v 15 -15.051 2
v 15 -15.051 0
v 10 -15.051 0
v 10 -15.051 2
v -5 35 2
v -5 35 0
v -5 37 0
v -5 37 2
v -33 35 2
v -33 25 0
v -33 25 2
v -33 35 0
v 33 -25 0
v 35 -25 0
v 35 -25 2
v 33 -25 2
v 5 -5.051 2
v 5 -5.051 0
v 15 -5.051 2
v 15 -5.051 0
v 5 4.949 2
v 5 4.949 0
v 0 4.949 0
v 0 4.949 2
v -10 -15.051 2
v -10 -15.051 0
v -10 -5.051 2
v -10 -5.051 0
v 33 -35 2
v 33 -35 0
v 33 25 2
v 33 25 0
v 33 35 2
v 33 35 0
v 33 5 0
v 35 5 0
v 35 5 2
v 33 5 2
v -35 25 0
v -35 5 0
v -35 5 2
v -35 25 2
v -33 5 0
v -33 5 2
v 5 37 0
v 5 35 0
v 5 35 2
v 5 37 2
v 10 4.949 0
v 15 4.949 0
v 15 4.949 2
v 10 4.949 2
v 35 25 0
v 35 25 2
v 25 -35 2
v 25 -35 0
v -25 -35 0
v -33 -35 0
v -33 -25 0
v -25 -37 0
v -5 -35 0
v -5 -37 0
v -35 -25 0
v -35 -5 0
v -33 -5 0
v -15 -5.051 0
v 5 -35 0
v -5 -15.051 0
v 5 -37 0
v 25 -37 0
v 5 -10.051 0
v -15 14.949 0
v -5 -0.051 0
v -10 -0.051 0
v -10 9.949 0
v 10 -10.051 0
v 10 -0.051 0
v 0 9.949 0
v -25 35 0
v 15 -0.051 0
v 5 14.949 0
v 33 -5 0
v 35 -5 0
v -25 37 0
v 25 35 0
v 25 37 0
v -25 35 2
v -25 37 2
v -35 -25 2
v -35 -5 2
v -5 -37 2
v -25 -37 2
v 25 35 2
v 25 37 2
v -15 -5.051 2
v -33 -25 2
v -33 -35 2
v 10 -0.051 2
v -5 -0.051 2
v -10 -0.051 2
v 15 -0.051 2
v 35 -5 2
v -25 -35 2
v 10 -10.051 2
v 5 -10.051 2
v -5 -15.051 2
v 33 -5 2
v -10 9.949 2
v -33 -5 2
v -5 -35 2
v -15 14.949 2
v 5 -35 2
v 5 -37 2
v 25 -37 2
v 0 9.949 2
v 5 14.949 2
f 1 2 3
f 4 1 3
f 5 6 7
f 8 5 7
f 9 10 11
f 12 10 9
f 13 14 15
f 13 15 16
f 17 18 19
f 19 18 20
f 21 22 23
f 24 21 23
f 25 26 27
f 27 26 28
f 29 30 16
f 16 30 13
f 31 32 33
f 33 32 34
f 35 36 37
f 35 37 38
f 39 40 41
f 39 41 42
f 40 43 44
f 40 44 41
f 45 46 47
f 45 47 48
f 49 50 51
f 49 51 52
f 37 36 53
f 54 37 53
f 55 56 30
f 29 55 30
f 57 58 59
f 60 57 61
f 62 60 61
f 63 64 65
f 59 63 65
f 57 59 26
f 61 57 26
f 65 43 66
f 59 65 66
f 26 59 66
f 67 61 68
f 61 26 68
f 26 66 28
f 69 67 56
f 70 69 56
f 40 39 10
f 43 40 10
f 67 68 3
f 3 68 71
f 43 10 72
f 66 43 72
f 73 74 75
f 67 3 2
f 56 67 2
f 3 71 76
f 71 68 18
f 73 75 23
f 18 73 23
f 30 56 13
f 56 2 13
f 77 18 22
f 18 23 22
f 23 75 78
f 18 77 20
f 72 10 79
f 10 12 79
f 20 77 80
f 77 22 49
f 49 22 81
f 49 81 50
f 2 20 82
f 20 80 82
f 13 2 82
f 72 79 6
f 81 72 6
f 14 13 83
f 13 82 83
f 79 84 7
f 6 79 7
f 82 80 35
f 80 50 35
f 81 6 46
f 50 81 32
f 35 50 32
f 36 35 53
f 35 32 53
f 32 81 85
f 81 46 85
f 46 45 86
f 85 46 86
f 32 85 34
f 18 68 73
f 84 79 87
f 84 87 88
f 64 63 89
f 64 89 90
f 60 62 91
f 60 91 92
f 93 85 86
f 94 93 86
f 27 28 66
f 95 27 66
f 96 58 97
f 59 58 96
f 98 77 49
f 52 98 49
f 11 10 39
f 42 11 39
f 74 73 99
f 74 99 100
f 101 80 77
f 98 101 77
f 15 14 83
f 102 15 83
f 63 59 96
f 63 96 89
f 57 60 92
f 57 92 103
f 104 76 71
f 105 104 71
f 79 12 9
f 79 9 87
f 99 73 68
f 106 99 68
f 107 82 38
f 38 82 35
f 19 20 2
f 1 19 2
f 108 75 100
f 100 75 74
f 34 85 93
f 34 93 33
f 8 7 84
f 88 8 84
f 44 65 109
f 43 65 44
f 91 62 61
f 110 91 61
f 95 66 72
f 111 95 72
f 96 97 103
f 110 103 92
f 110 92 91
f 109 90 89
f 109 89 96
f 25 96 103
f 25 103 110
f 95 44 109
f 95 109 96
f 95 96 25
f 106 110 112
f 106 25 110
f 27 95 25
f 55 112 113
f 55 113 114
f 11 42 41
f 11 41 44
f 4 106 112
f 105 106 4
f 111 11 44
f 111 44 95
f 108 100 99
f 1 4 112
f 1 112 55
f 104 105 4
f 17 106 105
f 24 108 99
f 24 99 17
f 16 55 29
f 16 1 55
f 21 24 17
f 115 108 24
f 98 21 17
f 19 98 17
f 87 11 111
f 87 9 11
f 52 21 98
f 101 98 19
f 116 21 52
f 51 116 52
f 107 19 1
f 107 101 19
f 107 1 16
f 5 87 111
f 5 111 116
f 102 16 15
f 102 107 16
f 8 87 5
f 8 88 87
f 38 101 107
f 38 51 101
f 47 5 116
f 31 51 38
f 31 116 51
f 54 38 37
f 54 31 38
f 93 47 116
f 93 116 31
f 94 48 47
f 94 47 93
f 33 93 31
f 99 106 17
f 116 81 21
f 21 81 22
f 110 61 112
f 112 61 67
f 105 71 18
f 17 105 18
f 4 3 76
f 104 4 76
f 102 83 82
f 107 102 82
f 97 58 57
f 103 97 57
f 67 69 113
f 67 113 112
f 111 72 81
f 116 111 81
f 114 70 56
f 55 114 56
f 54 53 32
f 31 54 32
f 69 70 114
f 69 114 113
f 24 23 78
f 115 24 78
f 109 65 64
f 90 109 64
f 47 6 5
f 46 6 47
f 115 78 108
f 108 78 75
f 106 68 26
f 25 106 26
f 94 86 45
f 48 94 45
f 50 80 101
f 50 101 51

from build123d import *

# Parameters (mm, degrees)
SKETCH1_W           = 66
SKETCH1_H           = 70
BOSS_EXTRUDE1_DEPTH = 2
SKETCH2_W           = 2
SKETCH2_H           = 20
BOSS_EXTRUDE2_DEPTH = 2
SKETCH3_W           = 20
SKETCH3_H           = 2
BOSS_EXTRUDE3_DEPTH = 2
SKETCH8_W           = 5
SKETCH8_H           = 5
CUT_EXTRUDE4_DEPTH  = 10


with BuildPart() as part:
    # Sketch1 → Boss-Extrude1 (new body)
    with BuildSketch(Plane.XY):
        Rectangle(SKETCH1_W, SKETCH1_H)
    extrude(amount=BOSS_EXTRUDE1_DEPTH)

    # Sketch2 → Boss-Extrude2 (add)
    with BuildSketch(Plane(origin=(0, 0, 0), x_dir=(-1, 0, 0), z_dir=(0, 0, -1))):
        with Locations((34, -15)):
            Rectangle(SKETCH2_W, SKETCH2_H)
        with Locations((34, 15)):
            Rectangle(SKETCH2_W, SKETCH2_H)
        with Locations((-34, -15)):
            Rectangle(SKETCH2_W, SKETCH2_H)
        with Locations((-34, 15)):
            Rectangle(SKETCH2_W, SKETCH2_H)
    extrude(amount=-BOSS_EXTRUDE2_DEPTH)

    # Sketch3 → Boss-Extrude3 (add)
    with BuildSketch(Plane(origin=(0, 0, 0), x_dir=(-1, 0, 0), z_dir=(0, 0, -1))):
        with Locations((-15, 36)):
            Rectangle(SKETCH3_W, SKETCH3_H)
        with Locations((15, 36)):
            Rectangle(SKETCH3_W, SKETCH3_H)
        with Locations((-15, -36)):
            Rectangle(SKETCH3_W, SKETCH3_H)
        with Locations((15, -36)):
            Rectangle(SKETCH3_W, SKETCH3_H)
    extrude(amount=-BOSS_EXTRUDE3_DEPTH)

    # Sketch8 → Cut-Extrude4 (cut)
    with BuildSketch(Plane(origin=(0, 0, 0), x_dir=(-1, 0, 0), z_dir=(0, 0, -1))):
        with Locations((-12.5, -12.550886484)):
            Rectangle(SKETCH8_W, SKETCH8_H)
        with Locations((-12.5, -7.550886484)):
            Rectangle(SKETCH8_W, SKETCH8_H)
        with Locations((-7.5, -7.550886484)):
            Rectangle(SKETCH8_W, SKETCH8_H)
        with Locations((-12.5, 2.449113516)):
            Rectangle(SKETCH8_W, SKETCH8_H)
        with Locations((-2.5, 7.449113516)):
            Rectangle(SKETCH8_W, SKETCH8_H)
        with Locations((-2.5, 12.449113516)):
            Rectangle(SKETCH8_W, SKETCH8_H)
        with Locations((2.5, 12.449113516)):
            Rectangle(SKETCH8_W, SKETCH8_H)
        with Locations((7.5, 12.449113516)):
            Rectangle(SKETCH8_W, SKETCH8_H)
        with Locations((12.5, 12.449113516)):
            Rectangle(SKETCH8_W, SKETCH8_H)
        with Locations((12.5, 7.449113516)):
            Rectangle(SKETCH8_W, SKETCH8_H)
        with Locations((12.5, 2.449113516)):
            Rectangle(SKETCH8_W, SKETCH8_H)
        with Locations((12.5, -2.550886484)):
            Rectangle(SKETCH8_W, SKETCH8_H)
        with Locations((7.5, -2.550886484)):
            Rectangle(SKETCH8_W, SKETCH8_H)
        with Locations((7.5, -7.550886484)):
            Rectangle(SKETCH8_W, SKETCH8_H)
        with Locations((7.5, -12.550886484)):
            Rectangle(SKETCH8_W, SKETCH8_H)
    extrude(amount=-CUT_EXTRUDE4_DEPTH, mode=Mode.SUBTRACT)


solid = part.part
